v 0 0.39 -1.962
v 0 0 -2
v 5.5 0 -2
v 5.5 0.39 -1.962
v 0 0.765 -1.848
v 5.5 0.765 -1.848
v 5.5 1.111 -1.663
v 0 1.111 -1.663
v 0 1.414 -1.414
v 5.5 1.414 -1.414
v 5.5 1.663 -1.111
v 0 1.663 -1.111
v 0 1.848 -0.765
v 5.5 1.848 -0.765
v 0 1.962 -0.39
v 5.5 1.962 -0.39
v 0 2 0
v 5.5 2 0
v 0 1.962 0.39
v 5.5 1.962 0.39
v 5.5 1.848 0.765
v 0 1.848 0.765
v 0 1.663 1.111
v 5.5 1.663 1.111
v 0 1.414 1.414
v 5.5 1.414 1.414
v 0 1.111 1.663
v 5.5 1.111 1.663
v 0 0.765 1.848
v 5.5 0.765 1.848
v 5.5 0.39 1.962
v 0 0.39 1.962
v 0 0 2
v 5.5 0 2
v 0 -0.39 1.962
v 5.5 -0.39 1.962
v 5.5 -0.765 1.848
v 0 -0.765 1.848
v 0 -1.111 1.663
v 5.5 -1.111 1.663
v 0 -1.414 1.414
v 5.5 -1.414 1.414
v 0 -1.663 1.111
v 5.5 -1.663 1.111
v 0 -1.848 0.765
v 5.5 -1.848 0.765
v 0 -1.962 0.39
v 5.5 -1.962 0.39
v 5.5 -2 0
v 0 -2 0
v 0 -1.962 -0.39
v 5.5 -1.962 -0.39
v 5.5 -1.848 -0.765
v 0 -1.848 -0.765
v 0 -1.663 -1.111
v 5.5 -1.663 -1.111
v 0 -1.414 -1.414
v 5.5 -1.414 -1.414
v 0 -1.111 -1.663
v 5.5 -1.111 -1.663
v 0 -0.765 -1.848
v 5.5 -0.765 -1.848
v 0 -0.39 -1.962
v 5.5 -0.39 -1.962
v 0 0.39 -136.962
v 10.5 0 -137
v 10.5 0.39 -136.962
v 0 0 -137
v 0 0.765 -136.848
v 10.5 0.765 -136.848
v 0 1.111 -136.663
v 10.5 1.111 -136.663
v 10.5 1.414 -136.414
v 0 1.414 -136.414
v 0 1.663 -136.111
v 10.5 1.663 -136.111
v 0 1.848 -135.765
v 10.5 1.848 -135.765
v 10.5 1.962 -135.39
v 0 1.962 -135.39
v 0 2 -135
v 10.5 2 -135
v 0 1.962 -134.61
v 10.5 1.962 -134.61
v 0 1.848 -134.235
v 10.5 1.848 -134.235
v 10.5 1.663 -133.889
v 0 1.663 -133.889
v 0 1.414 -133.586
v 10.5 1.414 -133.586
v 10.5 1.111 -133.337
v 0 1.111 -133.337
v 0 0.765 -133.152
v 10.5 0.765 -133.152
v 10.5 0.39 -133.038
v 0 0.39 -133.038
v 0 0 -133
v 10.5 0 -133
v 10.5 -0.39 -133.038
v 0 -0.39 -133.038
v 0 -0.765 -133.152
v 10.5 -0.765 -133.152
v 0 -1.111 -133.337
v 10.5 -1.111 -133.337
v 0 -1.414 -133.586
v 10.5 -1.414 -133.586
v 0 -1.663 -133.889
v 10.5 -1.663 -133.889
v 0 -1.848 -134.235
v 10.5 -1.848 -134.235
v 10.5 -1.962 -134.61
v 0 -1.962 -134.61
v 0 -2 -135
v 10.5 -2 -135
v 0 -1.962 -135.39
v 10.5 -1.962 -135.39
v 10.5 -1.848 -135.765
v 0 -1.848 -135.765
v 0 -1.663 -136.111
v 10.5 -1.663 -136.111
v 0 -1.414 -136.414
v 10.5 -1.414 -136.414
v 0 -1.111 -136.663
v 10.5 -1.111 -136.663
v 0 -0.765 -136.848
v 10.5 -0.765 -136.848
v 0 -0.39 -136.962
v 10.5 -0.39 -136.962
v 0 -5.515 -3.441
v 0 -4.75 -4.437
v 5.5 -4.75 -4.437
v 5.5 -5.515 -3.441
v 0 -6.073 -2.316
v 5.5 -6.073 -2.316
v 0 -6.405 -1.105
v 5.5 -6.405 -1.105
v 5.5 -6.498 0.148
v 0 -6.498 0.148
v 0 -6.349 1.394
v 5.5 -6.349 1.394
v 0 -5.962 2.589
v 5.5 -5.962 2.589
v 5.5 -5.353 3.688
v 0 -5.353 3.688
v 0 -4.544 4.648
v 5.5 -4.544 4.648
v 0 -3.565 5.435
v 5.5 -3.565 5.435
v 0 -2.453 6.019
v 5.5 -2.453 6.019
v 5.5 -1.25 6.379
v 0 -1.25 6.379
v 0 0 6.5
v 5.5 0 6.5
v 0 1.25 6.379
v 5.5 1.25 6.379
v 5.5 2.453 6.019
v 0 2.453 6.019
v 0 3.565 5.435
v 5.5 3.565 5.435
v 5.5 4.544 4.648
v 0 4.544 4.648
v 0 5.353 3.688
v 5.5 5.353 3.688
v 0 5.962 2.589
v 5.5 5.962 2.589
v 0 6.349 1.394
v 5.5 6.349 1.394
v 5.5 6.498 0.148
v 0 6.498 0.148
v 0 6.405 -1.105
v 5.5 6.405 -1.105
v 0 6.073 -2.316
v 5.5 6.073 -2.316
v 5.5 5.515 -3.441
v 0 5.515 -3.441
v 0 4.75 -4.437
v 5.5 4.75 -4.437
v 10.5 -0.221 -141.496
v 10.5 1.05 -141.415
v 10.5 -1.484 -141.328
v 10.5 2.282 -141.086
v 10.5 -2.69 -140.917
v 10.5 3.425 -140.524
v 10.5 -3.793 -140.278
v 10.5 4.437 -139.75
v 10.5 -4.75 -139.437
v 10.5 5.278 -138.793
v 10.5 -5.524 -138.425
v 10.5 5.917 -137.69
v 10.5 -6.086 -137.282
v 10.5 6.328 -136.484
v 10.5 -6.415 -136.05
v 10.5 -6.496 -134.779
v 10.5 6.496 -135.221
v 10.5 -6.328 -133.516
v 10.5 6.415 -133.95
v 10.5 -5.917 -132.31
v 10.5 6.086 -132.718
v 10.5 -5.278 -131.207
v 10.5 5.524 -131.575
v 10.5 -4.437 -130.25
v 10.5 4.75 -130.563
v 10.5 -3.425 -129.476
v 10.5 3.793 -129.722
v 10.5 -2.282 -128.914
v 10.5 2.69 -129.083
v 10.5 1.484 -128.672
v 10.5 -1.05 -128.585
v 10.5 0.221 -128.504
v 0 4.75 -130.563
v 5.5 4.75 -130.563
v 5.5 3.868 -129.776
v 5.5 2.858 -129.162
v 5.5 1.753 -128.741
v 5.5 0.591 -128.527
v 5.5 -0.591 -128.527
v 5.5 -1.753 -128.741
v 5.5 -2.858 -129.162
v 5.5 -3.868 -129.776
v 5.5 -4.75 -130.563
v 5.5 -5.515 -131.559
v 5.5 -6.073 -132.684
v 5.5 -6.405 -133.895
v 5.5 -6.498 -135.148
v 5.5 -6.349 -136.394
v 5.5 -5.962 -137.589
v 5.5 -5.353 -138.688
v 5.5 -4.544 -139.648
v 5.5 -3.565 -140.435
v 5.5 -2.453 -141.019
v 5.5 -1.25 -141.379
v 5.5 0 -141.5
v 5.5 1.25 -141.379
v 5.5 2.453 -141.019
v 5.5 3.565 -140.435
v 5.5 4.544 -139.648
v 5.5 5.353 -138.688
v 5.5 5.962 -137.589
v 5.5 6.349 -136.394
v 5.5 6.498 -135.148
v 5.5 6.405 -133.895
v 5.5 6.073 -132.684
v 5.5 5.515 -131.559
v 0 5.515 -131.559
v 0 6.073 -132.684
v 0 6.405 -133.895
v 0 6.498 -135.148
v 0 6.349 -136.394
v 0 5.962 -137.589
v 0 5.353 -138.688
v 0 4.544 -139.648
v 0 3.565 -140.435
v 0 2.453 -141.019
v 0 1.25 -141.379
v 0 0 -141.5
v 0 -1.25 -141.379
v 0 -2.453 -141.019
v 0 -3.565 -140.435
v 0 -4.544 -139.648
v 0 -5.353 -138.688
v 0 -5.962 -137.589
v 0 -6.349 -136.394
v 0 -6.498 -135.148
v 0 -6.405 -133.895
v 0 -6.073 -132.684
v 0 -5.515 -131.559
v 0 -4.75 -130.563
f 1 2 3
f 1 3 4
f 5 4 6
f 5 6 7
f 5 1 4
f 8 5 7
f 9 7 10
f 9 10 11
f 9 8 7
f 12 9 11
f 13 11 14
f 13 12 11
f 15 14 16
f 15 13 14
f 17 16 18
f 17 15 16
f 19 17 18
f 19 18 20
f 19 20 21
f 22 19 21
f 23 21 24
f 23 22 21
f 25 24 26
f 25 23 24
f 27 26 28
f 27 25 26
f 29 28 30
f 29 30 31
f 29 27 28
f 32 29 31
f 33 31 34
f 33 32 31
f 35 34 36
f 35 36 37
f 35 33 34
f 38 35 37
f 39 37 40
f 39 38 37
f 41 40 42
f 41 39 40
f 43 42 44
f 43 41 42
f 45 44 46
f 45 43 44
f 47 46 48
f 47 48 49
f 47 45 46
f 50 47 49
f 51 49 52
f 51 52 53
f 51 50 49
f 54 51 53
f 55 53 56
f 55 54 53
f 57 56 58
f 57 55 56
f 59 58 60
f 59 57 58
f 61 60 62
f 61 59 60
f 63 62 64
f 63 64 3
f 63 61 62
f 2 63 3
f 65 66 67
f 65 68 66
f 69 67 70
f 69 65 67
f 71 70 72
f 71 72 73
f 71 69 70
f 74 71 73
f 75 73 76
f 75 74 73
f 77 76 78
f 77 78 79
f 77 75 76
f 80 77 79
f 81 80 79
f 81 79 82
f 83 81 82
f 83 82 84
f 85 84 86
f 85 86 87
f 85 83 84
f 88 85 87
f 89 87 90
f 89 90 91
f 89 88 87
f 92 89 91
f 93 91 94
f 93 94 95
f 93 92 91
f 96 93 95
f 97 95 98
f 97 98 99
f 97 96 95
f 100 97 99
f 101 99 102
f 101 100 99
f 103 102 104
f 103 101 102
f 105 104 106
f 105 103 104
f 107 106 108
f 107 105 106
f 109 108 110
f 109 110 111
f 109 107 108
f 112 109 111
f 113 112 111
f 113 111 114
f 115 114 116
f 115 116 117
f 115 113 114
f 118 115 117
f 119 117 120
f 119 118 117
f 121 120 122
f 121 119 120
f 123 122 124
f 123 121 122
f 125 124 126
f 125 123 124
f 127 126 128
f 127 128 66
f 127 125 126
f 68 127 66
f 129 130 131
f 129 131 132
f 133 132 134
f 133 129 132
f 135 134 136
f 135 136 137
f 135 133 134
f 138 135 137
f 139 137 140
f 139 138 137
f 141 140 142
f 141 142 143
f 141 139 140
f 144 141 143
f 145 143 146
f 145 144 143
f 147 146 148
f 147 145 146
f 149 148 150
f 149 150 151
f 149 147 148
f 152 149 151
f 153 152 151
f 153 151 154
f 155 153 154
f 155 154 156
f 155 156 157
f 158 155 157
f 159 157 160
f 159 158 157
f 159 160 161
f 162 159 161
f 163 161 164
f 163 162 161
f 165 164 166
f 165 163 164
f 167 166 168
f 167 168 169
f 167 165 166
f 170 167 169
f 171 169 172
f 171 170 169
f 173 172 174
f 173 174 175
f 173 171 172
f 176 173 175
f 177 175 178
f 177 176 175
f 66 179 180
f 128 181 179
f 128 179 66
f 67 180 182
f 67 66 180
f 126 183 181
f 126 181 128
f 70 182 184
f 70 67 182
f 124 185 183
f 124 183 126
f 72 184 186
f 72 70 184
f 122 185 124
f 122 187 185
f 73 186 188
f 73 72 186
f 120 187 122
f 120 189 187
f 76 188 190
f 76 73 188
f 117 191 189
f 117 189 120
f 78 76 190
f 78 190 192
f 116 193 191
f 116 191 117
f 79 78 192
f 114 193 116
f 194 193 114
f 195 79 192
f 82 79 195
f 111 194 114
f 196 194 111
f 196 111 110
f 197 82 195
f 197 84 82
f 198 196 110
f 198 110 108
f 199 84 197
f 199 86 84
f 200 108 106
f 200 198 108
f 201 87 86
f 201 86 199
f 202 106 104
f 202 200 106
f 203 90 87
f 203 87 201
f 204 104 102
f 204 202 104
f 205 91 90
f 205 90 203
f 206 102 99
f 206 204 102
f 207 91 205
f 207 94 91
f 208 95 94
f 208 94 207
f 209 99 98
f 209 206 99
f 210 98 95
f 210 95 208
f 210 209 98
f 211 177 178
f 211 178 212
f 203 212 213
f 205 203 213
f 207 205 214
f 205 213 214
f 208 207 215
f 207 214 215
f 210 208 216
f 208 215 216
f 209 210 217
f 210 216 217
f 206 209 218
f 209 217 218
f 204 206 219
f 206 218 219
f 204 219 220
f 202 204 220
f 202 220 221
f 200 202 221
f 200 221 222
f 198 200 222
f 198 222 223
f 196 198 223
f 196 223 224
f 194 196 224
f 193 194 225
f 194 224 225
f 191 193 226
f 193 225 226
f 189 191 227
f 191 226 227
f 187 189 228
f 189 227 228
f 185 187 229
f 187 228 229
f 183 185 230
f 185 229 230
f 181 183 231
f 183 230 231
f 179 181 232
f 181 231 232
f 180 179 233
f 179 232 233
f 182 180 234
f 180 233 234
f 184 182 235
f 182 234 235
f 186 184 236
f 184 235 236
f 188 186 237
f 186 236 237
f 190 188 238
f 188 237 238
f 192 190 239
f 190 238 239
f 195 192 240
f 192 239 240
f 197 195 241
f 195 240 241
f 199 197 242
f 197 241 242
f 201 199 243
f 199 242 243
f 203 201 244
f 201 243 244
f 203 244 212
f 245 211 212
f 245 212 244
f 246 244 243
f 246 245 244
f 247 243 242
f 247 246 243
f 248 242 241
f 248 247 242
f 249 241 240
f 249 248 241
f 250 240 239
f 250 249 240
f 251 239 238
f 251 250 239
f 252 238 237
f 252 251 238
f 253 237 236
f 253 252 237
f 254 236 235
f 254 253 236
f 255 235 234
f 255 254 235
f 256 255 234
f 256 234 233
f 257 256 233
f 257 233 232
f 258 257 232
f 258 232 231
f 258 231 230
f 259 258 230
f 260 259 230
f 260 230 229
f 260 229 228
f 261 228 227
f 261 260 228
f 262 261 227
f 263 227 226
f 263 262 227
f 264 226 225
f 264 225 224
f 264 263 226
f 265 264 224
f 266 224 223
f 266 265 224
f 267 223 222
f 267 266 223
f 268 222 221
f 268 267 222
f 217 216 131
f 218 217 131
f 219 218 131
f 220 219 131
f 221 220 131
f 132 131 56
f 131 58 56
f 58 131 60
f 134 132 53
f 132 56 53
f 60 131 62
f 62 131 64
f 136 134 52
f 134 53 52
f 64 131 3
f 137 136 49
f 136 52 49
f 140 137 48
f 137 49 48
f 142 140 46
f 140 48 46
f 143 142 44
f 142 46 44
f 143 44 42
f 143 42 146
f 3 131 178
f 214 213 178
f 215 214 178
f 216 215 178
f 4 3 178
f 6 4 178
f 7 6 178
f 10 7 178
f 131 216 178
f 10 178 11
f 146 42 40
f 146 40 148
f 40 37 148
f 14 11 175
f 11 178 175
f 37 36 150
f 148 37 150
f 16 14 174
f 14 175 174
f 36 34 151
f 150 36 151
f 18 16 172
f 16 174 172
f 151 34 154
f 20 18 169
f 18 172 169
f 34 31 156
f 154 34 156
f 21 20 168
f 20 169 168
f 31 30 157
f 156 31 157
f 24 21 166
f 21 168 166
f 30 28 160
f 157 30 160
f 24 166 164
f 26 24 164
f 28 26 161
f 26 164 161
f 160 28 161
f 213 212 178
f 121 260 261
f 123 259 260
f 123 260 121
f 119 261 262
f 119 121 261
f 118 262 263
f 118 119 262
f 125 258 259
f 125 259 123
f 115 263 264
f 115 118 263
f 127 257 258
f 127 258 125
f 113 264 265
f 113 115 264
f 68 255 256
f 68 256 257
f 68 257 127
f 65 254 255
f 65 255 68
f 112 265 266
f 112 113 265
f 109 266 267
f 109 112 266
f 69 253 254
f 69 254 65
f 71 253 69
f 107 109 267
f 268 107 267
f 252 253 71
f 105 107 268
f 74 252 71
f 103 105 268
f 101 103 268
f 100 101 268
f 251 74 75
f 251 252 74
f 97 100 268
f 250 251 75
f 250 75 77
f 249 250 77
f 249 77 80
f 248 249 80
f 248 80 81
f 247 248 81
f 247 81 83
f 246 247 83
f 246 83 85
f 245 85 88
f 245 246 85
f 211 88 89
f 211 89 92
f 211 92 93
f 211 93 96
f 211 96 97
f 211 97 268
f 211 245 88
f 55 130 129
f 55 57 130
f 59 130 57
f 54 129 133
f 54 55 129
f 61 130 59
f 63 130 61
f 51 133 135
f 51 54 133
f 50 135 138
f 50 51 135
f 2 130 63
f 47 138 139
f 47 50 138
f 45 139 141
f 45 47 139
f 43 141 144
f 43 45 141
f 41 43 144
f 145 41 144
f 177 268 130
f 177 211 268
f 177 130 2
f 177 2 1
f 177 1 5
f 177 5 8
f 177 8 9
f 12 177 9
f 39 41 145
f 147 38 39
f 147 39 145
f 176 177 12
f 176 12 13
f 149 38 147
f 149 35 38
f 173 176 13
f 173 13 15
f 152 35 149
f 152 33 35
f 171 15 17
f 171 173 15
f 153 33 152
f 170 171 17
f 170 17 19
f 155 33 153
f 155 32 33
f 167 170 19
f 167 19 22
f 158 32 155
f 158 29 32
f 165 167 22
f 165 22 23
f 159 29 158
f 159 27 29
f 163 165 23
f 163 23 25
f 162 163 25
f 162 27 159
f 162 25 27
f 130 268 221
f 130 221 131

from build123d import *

# Parameters (mm, degrees)
SKETCH1_R           = 2
BOSS_EXTRUDE1_DEPTH = 5.5
SKETCH2_R           = 6.5
SKETCH2_R_2         = 2
BOSS_EXTRUDE3_DEPTH = 5


with BuildPart() as part:
    # Sketch1 → Boss-Extrude1 (new body)
    with BuildSketch(Plane(origin=(0, 0, 0), x_dir=(0, 0, -1), z_dir=(1, 0, 0))):
        with BuildLine():
            Line((4.437059837, 4.75), (130.562940163, 4.75))
            ThreePointArc((130.562940163, 4.75), (141.5, 0), (130.562940163, -4.75))
            Line((130.562940163, -4.75), (4.437059837, -4.75))
            ThreePointArc((4.437059837, -4.75), (-6.5, 0), (4.437059837, 4.75))
        make_face()
        Circle(SKETCH1_R, mode=Mode.SUBTRACT)
        with Locations((135, 0)):
            Circle(SKETCH1_R, mode=Mode.SUBTRACT)
    extrude(amount=BOSS_EXTRUDE1_DEPTH)

    # Sketch2 → Boss-Extrude3 (add)
    with BuildSketch(Plane(origin=(5.5, 0, 0), x_dir=(0, 0, -1), z_dir=(1, 0, 0))):
        with Locations(Location((135, 0, 0), (0, 0, 133.0490798))):
            Circle(SKETCH2_R)
        with Locations((135, 0)):
            Circle(SKETCH2_R_2, mode=Mode.SUBTRACT)
    extrude(amount=BOSS_EXTRUDE3_DEPTH)


solid = part.part
